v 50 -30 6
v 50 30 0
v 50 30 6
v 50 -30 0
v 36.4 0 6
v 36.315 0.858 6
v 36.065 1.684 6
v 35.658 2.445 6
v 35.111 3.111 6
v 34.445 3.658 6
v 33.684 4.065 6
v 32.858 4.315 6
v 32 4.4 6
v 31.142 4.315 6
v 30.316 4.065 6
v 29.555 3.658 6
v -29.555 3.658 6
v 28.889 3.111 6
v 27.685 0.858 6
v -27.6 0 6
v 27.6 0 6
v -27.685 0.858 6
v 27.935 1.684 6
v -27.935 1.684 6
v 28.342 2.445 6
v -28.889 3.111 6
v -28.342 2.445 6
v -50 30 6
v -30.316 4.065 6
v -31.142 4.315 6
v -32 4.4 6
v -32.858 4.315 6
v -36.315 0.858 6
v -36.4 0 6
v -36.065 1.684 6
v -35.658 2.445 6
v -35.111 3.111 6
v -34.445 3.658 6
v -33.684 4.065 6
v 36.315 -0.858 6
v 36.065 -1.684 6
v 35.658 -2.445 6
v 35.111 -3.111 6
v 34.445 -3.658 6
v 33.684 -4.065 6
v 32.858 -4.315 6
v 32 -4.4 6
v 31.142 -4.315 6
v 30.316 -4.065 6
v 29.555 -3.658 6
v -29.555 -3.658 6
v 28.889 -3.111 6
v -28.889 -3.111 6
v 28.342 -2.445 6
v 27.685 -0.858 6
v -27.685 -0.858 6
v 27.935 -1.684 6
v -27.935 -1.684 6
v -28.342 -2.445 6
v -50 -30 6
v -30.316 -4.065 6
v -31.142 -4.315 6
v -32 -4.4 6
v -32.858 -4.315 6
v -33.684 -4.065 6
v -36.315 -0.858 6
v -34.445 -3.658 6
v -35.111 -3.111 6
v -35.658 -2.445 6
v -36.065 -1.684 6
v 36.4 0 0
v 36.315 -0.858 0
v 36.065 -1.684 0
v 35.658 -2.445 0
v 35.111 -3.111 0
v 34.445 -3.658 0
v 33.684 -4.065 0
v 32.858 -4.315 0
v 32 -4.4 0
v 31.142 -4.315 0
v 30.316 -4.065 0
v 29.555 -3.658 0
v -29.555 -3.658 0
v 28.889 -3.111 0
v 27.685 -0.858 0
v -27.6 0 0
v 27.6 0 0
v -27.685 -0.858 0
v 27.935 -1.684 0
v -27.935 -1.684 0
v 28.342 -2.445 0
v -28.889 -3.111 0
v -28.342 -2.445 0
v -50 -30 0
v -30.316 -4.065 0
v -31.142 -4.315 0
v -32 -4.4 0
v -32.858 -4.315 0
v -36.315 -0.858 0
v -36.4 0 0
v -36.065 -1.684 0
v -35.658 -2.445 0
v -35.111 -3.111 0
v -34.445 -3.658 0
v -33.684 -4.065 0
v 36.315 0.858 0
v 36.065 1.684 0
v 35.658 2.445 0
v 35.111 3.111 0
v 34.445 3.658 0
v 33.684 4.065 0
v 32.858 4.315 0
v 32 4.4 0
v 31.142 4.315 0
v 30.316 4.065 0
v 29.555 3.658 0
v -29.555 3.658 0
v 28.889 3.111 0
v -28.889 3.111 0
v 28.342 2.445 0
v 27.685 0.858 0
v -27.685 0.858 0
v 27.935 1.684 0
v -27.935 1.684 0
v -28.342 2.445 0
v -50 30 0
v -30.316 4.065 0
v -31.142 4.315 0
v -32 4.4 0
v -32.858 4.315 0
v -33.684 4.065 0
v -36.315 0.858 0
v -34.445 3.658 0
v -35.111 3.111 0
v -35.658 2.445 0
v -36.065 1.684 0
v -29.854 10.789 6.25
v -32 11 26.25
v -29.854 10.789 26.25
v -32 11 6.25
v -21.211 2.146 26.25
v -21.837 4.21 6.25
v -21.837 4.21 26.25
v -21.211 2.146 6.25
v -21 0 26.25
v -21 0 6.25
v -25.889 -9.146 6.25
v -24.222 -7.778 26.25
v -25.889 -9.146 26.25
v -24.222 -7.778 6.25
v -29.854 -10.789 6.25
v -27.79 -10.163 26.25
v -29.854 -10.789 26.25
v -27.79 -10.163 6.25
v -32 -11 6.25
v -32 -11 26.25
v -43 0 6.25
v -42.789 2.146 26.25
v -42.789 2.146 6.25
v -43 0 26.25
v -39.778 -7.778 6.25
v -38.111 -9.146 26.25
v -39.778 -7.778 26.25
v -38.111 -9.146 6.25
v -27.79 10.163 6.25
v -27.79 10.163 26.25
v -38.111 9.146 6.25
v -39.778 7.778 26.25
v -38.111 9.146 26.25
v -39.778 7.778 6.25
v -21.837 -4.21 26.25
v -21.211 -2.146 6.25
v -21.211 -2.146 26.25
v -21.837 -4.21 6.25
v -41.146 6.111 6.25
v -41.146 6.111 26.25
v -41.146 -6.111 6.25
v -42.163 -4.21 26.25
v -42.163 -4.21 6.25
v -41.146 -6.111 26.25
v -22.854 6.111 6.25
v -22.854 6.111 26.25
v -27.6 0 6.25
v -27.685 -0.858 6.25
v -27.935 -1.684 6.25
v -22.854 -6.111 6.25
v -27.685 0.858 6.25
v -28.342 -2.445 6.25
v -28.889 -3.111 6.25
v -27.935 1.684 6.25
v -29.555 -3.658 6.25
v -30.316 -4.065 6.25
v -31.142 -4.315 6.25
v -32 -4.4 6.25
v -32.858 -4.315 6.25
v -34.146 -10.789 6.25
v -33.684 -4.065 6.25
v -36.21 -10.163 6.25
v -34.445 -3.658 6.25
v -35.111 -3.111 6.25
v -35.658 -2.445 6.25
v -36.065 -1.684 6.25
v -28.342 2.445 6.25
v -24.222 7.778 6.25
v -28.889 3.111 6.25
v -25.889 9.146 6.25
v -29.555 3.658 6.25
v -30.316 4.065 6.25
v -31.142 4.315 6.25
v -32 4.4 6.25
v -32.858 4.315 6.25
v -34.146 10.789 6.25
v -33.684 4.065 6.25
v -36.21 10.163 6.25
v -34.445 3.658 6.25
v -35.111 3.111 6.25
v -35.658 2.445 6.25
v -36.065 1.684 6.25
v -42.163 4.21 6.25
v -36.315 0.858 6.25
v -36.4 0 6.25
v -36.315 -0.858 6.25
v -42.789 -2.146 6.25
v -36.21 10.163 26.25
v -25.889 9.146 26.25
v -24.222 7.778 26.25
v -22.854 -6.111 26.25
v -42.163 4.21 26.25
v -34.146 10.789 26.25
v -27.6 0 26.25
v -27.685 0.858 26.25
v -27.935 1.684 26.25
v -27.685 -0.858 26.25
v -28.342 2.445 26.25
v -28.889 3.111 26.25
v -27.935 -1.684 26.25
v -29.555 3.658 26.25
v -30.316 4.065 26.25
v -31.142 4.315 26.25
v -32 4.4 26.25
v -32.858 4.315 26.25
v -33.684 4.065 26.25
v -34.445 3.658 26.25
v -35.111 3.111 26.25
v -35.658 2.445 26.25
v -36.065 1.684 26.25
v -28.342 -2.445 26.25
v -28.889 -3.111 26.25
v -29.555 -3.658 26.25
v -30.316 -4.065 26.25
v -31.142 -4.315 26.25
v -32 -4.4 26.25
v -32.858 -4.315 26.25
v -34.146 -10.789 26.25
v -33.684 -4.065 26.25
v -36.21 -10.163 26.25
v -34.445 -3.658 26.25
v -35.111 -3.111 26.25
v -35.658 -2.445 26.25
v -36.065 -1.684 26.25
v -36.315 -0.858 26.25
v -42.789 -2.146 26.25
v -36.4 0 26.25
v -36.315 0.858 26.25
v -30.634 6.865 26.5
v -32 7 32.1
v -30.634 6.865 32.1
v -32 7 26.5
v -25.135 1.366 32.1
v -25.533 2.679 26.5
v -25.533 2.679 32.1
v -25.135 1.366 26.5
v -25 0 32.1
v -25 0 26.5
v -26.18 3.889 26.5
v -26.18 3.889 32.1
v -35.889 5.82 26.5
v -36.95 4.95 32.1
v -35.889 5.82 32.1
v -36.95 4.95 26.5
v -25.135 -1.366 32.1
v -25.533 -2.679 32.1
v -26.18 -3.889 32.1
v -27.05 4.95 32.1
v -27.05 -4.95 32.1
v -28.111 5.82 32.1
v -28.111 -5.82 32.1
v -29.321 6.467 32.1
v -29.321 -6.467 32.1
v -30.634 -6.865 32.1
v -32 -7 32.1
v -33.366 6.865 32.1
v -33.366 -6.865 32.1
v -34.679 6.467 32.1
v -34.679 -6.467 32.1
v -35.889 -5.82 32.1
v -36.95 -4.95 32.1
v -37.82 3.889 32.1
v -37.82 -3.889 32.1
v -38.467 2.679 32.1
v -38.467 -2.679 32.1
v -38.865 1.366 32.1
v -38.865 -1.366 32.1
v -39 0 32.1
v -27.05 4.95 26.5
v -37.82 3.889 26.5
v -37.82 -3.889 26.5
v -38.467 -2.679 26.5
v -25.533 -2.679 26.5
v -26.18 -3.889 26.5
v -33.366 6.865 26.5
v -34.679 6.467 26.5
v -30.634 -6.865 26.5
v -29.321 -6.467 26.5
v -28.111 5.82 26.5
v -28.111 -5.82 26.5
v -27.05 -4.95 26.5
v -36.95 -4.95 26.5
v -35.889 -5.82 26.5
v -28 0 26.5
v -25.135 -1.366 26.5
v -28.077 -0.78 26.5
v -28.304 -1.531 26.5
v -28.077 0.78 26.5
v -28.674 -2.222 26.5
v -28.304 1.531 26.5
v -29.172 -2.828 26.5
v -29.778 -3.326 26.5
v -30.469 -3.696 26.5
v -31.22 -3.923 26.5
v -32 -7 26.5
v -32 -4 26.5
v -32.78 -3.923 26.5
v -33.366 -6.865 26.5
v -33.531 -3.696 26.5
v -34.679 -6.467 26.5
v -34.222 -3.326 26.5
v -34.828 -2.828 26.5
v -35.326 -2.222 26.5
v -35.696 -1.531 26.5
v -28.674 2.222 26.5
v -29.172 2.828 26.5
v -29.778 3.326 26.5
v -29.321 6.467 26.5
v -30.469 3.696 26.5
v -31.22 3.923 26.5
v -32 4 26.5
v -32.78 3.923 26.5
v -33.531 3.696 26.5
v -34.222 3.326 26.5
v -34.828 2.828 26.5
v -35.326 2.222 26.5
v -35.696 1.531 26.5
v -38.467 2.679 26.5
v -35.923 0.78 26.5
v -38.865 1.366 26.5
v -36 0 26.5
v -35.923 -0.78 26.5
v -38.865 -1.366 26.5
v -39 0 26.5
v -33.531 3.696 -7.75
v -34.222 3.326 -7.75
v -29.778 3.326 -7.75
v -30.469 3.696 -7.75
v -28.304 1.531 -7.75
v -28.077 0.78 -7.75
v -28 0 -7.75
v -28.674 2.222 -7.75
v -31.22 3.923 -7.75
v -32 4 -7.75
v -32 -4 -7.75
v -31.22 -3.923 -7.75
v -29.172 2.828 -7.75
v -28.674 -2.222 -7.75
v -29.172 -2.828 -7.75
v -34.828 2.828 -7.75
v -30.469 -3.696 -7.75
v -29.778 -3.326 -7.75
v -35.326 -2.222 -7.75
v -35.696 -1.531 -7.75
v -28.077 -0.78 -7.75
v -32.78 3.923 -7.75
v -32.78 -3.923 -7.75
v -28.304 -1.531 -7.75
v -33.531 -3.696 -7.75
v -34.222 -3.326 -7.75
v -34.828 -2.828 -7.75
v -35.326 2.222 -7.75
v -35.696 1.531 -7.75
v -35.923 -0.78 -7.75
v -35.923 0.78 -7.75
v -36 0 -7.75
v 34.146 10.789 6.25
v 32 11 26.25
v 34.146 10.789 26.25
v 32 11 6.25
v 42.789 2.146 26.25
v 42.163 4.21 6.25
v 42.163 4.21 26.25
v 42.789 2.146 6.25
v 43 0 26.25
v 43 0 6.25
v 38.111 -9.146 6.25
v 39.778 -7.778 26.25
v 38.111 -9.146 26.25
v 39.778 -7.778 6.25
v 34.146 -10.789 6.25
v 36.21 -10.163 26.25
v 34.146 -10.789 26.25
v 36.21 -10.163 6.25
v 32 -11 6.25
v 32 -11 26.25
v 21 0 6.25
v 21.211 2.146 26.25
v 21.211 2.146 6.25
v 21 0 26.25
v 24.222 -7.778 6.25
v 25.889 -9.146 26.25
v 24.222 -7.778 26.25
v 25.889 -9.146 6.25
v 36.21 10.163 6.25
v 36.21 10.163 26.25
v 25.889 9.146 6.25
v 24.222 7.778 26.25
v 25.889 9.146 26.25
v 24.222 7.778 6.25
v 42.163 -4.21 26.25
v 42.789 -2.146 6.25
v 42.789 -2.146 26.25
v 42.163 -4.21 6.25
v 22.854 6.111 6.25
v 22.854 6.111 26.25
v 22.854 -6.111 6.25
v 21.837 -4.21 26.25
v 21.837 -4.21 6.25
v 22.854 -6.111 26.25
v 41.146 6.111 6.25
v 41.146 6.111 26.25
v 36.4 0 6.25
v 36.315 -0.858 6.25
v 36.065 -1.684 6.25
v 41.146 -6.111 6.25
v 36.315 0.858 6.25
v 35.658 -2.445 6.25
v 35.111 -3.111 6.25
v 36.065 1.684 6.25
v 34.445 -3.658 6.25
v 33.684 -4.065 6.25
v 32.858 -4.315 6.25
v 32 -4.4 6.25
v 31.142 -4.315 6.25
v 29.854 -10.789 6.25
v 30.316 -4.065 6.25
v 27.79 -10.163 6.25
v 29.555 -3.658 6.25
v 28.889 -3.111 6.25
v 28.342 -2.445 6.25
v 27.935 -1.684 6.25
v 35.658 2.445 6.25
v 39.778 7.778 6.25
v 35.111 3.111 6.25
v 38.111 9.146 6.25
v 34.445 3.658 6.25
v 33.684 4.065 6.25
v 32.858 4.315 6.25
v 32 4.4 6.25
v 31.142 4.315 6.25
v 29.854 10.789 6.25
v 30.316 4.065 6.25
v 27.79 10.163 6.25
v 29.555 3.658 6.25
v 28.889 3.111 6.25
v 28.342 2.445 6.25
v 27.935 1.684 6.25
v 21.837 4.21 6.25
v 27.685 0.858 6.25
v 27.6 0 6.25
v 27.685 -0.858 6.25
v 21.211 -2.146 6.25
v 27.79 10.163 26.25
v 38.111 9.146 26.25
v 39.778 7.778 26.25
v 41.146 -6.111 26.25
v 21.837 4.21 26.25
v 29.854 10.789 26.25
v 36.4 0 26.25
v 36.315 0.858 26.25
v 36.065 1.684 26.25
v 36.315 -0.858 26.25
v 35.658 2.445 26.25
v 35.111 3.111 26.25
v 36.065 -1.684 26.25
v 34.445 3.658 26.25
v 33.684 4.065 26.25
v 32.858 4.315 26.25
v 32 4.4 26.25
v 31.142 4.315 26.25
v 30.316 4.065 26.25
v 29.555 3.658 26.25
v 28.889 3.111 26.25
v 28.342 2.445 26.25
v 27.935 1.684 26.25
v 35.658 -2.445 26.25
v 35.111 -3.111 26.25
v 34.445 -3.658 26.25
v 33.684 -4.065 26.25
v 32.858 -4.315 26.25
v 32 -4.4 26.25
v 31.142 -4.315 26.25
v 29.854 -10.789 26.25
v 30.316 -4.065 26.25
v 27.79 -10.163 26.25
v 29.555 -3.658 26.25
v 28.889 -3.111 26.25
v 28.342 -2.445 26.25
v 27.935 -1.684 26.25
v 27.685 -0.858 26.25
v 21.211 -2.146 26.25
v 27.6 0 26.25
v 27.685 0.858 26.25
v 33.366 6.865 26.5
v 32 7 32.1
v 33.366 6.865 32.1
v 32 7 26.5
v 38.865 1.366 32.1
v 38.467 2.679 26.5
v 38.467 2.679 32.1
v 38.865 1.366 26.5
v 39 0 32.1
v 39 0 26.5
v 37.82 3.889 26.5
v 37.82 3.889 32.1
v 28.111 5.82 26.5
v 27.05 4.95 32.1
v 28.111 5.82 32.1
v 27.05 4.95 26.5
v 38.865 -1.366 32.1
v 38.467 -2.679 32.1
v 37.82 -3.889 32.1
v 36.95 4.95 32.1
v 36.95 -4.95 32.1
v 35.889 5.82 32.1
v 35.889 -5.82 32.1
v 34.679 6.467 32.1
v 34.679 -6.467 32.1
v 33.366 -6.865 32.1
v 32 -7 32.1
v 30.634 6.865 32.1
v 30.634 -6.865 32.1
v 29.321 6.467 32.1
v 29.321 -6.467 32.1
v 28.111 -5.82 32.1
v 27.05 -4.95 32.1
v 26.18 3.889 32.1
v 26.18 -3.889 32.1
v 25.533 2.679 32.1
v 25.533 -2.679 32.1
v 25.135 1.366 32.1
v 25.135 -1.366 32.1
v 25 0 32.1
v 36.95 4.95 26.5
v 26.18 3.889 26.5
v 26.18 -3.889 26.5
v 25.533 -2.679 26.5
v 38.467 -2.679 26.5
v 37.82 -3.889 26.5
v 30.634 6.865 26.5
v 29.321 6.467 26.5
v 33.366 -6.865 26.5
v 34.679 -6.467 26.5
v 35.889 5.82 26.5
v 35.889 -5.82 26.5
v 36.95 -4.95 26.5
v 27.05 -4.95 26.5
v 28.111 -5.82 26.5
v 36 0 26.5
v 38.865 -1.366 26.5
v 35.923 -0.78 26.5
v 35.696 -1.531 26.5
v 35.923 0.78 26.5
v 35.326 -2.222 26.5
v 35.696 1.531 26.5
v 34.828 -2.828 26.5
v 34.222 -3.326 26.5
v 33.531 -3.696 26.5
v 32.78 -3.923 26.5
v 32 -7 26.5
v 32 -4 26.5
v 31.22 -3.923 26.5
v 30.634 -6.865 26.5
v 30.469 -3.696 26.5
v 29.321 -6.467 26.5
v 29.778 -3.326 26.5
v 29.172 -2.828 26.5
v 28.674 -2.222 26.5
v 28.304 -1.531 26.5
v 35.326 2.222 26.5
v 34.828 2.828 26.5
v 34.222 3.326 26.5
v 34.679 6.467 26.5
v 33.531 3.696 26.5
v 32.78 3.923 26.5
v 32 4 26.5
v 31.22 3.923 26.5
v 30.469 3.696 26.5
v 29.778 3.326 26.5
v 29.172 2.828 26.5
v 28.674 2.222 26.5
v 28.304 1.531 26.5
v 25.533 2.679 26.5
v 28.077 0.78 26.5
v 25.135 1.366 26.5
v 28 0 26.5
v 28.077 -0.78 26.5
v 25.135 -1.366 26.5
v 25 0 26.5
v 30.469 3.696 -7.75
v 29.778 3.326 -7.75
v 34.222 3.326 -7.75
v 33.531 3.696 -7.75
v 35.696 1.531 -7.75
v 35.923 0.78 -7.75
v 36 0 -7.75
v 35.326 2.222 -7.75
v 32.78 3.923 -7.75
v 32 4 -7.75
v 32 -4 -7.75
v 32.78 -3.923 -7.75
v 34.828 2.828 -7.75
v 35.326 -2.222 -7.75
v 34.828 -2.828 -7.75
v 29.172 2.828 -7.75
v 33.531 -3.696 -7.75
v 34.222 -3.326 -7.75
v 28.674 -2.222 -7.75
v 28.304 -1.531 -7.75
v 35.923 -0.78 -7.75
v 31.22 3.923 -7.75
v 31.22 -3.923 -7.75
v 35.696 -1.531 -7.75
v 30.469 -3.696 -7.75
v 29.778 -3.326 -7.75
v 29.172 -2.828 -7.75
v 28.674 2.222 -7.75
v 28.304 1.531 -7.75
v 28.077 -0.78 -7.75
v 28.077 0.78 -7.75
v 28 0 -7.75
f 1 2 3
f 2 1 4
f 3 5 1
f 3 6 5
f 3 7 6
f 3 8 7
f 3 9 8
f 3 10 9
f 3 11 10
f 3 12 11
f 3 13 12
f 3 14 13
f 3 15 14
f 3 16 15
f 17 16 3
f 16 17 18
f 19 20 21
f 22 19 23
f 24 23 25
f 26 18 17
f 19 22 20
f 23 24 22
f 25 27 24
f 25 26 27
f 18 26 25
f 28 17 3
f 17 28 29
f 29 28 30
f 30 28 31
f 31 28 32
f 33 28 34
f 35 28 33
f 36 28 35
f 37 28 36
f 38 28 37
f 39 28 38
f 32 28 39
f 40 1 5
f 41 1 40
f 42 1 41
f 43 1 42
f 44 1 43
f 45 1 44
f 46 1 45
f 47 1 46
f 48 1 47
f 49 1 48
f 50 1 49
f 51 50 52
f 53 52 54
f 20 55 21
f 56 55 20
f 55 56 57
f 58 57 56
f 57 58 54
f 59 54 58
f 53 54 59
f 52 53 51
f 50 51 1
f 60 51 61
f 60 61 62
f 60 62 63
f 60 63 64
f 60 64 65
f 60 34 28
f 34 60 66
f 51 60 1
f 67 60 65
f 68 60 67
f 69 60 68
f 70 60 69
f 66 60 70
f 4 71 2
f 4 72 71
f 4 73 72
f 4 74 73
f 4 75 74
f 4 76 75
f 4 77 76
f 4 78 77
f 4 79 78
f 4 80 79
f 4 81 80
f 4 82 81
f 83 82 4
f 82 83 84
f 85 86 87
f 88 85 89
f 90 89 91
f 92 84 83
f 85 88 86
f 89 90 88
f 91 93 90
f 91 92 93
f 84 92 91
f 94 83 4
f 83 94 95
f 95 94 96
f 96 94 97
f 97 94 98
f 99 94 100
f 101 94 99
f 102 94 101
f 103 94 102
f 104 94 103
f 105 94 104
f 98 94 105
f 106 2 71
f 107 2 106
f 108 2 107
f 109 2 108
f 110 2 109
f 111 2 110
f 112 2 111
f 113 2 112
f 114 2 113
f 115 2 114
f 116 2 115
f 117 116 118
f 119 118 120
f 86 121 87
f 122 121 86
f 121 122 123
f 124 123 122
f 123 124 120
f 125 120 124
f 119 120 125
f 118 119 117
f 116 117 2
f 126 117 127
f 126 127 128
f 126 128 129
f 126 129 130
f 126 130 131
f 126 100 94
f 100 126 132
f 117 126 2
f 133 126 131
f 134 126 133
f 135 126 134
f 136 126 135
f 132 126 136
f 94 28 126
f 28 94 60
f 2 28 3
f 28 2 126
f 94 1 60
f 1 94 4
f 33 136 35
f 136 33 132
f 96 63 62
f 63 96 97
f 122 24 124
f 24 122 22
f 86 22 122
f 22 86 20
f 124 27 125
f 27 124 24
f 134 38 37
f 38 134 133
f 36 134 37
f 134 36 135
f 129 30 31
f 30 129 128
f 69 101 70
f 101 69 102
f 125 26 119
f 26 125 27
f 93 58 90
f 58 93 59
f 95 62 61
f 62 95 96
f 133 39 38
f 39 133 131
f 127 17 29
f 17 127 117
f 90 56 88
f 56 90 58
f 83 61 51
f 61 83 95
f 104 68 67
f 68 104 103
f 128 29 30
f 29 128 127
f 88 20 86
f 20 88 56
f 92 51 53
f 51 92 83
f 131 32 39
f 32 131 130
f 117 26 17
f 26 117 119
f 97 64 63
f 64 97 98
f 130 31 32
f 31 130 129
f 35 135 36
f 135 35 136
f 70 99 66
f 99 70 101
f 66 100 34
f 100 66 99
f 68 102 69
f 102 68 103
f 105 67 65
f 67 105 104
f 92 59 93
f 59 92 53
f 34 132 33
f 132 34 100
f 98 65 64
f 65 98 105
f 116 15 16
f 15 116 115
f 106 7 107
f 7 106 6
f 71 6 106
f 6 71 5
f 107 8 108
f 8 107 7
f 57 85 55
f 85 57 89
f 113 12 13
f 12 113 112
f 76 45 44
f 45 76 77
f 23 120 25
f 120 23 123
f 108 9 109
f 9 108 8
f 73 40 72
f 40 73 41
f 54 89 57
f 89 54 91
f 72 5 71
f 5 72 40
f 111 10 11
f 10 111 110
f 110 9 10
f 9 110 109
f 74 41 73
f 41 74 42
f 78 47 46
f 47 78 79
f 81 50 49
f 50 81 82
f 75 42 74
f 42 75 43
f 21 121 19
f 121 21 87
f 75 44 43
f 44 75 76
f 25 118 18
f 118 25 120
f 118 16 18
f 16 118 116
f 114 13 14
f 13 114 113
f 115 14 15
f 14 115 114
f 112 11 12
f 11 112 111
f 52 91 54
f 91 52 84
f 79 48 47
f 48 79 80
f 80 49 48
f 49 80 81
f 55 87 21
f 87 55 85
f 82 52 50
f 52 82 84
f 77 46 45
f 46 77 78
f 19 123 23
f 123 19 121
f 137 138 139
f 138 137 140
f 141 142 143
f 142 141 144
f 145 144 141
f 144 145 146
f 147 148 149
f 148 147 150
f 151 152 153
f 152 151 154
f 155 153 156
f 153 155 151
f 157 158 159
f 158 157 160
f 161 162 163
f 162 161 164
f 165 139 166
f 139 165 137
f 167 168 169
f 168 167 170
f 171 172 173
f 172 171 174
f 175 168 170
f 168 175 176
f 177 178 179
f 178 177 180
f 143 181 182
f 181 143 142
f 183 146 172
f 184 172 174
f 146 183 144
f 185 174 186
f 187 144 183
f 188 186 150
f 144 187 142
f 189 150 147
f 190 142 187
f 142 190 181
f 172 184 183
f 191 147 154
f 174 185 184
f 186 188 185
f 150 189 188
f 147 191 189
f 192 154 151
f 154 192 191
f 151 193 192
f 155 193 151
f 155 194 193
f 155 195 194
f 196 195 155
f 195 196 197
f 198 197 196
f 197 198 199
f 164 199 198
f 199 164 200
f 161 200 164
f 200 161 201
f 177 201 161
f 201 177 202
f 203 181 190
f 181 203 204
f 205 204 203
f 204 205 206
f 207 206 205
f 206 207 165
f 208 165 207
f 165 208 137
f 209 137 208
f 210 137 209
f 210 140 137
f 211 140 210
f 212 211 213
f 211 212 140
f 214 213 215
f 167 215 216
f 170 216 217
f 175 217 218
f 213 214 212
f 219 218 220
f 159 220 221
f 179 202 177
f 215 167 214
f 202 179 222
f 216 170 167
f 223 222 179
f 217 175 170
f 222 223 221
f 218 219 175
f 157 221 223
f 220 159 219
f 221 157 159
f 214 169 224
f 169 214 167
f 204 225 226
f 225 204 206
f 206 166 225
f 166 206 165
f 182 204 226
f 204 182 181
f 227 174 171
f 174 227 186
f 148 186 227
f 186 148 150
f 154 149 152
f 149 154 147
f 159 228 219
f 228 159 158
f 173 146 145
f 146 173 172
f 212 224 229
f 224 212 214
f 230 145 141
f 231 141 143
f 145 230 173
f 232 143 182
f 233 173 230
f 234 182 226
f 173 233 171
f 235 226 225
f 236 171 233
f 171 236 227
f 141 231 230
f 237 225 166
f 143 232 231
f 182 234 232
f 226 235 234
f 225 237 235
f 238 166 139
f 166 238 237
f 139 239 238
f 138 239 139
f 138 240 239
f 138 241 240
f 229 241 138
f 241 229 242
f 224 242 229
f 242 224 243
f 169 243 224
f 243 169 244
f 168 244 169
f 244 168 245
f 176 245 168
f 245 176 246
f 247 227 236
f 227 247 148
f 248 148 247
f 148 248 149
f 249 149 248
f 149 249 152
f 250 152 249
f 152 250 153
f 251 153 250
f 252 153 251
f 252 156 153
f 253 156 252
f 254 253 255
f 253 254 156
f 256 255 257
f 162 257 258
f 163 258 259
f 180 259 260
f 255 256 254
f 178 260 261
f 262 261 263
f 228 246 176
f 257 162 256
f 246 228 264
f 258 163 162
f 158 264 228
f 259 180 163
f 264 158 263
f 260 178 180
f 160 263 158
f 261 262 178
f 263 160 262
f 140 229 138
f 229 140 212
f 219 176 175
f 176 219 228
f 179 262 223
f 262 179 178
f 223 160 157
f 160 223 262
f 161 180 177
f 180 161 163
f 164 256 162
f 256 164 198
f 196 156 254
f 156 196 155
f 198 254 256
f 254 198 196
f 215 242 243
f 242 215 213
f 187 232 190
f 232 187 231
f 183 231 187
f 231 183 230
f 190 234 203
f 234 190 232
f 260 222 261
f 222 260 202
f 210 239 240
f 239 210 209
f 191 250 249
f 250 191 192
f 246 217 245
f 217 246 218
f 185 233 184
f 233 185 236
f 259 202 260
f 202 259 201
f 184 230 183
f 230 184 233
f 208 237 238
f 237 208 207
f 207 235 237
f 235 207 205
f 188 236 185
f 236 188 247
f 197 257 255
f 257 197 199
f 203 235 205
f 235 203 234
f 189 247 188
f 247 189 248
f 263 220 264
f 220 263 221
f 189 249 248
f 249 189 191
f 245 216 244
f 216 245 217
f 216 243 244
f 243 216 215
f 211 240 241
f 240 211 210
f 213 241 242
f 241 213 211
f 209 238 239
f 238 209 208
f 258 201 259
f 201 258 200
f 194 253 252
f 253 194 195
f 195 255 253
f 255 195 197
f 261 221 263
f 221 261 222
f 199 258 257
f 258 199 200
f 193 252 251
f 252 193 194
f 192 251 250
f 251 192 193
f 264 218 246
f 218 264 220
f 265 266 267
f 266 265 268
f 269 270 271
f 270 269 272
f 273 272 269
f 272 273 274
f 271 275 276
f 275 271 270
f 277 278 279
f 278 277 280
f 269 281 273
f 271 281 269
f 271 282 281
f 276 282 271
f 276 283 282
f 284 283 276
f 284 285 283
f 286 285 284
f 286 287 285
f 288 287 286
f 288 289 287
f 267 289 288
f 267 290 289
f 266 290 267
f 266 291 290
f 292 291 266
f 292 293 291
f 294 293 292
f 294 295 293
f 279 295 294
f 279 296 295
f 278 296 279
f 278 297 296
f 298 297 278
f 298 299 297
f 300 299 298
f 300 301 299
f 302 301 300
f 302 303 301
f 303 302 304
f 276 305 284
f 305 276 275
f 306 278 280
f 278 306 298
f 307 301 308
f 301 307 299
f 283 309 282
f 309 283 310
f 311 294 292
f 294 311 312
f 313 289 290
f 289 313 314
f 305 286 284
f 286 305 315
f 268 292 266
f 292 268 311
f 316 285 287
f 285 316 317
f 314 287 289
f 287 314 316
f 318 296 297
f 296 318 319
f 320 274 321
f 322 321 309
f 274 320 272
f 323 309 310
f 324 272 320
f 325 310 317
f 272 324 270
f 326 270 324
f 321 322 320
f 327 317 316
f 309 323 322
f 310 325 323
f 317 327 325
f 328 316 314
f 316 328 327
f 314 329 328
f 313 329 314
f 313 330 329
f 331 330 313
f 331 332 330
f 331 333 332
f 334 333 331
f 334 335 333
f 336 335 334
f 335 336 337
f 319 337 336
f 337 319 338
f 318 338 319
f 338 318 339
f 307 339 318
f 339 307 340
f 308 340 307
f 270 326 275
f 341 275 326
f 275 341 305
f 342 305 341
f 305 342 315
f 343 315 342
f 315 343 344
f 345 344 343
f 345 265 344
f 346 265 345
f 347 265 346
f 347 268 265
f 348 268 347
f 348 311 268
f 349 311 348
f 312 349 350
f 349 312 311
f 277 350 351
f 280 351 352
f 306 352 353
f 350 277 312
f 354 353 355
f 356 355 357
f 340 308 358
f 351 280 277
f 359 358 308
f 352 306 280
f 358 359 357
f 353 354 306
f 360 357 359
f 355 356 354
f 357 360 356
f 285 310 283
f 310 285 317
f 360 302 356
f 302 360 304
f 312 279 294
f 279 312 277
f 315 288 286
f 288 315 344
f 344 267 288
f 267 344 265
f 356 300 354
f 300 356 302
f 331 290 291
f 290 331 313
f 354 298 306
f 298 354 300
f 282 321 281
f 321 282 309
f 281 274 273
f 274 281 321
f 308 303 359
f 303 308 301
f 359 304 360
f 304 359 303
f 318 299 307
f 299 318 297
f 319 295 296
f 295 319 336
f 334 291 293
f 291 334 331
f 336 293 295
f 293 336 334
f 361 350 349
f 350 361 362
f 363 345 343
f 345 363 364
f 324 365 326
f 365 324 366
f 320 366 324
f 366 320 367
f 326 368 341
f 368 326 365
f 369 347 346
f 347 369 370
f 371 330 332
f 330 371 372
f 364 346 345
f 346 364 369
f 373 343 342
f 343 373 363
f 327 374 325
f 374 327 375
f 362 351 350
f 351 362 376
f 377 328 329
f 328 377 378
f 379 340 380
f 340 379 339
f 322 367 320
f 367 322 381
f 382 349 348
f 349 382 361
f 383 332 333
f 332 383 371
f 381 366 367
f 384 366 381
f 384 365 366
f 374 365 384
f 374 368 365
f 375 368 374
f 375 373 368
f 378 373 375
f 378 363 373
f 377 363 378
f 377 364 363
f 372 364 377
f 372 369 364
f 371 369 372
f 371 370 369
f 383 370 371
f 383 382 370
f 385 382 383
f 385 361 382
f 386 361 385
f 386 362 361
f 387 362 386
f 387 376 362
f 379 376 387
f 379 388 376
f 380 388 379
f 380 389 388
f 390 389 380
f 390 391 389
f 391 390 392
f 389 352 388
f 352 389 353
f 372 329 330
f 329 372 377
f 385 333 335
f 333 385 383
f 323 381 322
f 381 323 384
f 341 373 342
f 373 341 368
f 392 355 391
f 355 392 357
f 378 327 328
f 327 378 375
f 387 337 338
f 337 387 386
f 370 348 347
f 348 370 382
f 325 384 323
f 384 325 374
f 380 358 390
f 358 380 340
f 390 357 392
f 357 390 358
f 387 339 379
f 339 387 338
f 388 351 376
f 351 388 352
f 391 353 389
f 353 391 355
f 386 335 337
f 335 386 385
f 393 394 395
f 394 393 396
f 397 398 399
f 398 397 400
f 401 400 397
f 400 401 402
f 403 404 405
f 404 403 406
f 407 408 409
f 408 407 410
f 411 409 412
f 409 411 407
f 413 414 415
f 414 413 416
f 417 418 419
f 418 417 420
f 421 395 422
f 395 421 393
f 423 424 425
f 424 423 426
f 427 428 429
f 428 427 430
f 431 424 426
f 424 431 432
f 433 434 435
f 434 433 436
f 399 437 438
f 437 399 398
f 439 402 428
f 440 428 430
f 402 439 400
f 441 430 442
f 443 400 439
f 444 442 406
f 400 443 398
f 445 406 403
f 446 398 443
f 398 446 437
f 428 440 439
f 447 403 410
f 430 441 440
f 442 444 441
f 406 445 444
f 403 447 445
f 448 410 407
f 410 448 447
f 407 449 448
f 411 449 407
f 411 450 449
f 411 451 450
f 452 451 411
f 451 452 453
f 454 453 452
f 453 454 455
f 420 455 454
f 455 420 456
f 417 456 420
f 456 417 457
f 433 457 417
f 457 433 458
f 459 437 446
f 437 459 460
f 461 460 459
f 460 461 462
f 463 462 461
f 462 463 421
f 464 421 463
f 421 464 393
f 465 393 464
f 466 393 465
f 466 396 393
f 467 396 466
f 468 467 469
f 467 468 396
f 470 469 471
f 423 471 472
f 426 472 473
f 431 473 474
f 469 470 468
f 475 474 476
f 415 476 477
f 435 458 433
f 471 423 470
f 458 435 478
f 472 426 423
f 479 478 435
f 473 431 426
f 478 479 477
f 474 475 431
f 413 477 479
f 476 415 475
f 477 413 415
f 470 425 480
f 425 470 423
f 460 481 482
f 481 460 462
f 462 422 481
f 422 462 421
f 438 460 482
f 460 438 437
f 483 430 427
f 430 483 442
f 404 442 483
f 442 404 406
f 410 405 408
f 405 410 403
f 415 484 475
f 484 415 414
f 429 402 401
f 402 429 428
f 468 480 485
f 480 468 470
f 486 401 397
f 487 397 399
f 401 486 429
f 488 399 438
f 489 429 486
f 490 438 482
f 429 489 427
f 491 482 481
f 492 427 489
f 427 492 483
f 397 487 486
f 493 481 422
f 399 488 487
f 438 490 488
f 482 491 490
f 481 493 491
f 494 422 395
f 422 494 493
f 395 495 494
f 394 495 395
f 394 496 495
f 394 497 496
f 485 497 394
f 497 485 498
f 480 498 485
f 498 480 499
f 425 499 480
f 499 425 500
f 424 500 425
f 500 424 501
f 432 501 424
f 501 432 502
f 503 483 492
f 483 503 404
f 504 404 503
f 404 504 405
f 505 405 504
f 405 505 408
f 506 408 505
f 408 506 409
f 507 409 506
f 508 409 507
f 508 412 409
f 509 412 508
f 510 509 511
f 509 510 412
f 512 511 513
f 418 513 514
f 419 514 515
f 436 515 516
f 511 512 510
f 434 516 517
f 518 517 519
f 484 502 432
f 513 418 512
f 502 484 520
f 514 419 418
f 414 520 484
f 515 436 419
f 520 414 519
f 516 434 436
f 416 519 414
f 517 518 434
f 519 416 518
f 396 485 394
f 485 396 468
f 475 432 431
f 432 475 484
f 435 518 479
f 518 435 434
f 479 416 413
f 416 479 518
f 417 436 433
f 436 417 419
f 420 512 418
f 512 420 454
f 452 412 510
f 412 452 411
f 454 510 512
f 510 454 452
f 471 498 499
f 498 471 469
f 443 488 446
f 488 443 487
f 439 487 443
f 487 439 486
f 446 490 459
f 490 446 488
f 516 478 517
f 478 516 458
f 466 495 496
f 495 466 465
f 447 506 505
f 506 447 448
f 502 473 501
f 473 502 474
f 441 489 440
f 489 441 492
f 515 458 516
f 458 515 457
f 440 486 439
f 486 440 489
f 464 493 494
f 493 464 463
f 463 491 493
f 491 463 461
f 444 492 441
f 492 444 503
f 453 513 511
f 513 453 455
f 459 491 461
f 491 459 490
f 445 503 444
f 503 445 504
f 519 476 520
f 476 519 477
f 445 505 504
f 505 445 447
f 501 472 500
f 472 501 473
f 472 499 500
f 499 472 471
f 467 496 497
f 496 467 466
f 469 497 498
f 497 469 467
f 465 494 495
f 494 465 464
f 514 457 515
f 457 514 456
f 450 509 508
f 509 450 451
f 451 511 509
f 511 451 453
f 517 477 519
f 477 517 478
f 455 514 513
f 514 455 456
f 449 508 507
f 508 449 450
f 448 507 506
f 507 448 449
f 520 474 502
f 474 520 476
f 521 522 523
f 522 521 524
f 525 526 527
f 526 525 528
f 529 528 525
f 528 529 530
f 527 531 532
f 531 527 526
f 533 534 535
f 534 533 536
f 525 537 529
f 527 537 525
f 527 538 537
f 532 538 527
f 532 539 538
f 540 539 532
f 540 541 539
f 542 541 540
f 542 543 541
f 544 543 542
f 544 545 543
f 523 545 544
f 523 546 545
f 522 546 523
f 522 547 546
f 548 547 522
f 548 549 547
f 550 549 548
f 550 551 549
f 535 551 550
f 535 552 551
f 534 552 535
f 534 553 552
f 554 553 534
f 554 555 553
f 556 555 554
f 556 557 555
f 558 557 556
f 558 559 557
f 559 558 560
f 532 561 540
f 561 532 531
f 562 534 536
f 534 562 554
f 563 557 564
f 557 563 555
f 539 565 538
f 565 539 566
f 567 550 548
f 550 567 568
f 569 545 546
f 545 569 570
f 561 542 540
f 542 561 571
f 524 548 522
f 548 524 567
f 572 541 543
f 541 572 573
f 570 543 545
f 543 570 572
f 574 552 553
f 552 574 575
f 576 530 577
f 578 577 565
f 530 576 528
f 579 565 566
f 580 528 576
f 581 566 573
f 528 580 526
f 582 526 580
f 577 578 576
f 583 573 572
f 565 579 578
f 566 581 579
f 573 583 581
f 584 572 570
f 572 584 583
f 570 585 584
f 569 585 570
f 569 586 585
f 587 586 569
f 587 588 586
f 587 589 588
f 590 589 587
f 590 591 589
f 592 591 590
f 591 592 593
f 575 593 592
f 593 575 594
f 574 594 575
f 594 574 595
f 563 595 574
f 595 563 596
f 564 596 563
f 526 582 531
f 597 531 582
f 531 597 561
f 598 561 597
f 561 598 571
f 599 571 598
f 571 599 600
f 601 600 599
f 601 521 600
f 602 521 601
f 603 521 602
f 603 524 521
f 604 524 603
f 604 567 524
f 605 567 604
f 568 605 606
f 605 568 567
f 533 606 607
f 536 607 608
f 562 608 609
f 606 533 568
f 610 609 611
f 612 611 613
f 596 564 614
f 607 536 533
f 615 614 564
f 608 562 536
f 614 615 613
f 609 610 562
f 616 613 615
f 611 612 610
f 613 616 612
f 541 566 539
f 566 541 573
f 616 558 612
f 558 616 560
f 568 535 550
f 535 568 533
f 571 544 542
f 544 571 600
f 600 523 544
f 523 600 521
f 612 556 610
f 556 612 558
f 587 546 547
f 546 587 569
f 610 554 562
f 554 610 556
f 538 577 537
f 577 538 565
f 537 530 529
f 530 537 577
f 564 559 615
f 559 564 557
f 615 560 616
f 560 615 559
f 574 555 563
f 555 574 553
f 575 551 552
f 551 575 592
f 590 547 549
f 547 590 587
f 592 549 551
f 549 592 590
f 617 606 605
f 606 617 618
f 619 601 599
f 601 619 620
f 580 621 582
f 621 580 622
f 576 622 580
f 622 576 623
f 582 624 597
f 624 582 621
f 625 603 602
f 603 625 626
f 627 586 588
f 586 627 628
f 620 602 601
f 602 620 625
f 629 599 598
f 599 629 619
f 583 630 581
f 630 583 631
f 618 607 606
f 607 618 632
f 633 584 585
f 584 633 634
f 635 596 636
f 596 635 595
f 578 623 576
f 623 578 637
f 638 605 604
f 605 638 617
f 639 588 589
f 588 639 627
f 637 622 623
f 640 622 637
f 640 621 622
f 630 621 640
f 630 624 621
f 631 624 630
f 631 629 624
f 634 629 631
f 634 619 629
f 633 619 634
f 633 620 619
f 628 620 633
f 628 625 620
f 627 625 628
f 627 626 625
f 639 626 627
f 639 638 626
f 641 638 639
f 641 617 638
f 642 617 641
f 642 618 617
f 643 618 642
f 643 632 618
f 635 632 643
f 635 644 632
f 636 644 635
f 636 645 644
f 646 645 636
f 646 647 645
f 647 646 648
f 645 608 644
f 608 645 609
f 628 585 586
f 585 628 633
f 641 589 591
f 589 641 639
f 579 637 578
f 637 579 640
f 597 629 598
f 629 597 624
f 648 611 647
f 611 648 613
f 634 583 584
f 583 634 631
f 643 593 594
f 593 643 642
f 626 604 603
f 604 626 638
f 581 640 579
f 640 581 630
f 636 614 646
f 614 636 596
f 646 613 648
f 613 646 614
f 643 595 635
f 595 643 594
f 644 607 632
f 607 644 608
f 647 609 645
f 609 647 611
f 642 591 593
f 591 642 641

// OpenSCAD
$fn = 32;

// ------------------------------------------------------------------------
// Standoff columns: 2 d22 standoffs, bolts d8
// Every part is its own module, assembly() places them once.
// ------------------------------------------------------------------------

// --- part 1 ---
module base_plate() {
  difference() {
    translate([-50, -30, 0]) cube([100, 60, 6]);
    translate([-32, 0, -1]) cylinder(h = 8, d = 8.8);
    translate([32, 0, -1]) cylinder(h = 8, d = 8.8);
  }
}

// --- part 2 ---
module spacer1() {
  difference() {
      translate([0, 0, 0]) cylinder(h = 20, d = 22);
      translate([0, 0, -1]) cylinder(h = 22, d = 8.8);
    }
}

// --- part 3 ---
module bolt1() {
  cylinder(h = 5.6, d = 14);
  translate([0, 0, -34.25]) cylinder(h = 34.25, d = 8);
}

// --- part 4 ---
module spacer2() {
  difference() {
      translate([0, 0, 0]) cylinder(h = 20, d = 22);
      translate([0, 0, -1]) cylinder(h = 22, d = 8.8);
    }
}

// --- part 5 ---
module bolt2() {
  cylinder(h = 5.6, d = 14);
  translate([0, 0, -34.25]) cylinder(h = 34.25, d = 8);
}

// --- assembly ---
module assembly() {
  translate([0, 0, 0]) rotate([0, 0, 0]) base_plate();
  translate([-32, 0, 6.25]) rotate([0, 0, 0]) spacer1();
  translate([-32, 0, 26.5]) rotate([0, 0, 0]) bolt1();
  translate([32, 0, 6.25]) rotate([0, 0, 0]) spacer2();
  translate([32, 0, 26.5]) rotate([0, 0, 0]) bolt2();
}

assembly();
